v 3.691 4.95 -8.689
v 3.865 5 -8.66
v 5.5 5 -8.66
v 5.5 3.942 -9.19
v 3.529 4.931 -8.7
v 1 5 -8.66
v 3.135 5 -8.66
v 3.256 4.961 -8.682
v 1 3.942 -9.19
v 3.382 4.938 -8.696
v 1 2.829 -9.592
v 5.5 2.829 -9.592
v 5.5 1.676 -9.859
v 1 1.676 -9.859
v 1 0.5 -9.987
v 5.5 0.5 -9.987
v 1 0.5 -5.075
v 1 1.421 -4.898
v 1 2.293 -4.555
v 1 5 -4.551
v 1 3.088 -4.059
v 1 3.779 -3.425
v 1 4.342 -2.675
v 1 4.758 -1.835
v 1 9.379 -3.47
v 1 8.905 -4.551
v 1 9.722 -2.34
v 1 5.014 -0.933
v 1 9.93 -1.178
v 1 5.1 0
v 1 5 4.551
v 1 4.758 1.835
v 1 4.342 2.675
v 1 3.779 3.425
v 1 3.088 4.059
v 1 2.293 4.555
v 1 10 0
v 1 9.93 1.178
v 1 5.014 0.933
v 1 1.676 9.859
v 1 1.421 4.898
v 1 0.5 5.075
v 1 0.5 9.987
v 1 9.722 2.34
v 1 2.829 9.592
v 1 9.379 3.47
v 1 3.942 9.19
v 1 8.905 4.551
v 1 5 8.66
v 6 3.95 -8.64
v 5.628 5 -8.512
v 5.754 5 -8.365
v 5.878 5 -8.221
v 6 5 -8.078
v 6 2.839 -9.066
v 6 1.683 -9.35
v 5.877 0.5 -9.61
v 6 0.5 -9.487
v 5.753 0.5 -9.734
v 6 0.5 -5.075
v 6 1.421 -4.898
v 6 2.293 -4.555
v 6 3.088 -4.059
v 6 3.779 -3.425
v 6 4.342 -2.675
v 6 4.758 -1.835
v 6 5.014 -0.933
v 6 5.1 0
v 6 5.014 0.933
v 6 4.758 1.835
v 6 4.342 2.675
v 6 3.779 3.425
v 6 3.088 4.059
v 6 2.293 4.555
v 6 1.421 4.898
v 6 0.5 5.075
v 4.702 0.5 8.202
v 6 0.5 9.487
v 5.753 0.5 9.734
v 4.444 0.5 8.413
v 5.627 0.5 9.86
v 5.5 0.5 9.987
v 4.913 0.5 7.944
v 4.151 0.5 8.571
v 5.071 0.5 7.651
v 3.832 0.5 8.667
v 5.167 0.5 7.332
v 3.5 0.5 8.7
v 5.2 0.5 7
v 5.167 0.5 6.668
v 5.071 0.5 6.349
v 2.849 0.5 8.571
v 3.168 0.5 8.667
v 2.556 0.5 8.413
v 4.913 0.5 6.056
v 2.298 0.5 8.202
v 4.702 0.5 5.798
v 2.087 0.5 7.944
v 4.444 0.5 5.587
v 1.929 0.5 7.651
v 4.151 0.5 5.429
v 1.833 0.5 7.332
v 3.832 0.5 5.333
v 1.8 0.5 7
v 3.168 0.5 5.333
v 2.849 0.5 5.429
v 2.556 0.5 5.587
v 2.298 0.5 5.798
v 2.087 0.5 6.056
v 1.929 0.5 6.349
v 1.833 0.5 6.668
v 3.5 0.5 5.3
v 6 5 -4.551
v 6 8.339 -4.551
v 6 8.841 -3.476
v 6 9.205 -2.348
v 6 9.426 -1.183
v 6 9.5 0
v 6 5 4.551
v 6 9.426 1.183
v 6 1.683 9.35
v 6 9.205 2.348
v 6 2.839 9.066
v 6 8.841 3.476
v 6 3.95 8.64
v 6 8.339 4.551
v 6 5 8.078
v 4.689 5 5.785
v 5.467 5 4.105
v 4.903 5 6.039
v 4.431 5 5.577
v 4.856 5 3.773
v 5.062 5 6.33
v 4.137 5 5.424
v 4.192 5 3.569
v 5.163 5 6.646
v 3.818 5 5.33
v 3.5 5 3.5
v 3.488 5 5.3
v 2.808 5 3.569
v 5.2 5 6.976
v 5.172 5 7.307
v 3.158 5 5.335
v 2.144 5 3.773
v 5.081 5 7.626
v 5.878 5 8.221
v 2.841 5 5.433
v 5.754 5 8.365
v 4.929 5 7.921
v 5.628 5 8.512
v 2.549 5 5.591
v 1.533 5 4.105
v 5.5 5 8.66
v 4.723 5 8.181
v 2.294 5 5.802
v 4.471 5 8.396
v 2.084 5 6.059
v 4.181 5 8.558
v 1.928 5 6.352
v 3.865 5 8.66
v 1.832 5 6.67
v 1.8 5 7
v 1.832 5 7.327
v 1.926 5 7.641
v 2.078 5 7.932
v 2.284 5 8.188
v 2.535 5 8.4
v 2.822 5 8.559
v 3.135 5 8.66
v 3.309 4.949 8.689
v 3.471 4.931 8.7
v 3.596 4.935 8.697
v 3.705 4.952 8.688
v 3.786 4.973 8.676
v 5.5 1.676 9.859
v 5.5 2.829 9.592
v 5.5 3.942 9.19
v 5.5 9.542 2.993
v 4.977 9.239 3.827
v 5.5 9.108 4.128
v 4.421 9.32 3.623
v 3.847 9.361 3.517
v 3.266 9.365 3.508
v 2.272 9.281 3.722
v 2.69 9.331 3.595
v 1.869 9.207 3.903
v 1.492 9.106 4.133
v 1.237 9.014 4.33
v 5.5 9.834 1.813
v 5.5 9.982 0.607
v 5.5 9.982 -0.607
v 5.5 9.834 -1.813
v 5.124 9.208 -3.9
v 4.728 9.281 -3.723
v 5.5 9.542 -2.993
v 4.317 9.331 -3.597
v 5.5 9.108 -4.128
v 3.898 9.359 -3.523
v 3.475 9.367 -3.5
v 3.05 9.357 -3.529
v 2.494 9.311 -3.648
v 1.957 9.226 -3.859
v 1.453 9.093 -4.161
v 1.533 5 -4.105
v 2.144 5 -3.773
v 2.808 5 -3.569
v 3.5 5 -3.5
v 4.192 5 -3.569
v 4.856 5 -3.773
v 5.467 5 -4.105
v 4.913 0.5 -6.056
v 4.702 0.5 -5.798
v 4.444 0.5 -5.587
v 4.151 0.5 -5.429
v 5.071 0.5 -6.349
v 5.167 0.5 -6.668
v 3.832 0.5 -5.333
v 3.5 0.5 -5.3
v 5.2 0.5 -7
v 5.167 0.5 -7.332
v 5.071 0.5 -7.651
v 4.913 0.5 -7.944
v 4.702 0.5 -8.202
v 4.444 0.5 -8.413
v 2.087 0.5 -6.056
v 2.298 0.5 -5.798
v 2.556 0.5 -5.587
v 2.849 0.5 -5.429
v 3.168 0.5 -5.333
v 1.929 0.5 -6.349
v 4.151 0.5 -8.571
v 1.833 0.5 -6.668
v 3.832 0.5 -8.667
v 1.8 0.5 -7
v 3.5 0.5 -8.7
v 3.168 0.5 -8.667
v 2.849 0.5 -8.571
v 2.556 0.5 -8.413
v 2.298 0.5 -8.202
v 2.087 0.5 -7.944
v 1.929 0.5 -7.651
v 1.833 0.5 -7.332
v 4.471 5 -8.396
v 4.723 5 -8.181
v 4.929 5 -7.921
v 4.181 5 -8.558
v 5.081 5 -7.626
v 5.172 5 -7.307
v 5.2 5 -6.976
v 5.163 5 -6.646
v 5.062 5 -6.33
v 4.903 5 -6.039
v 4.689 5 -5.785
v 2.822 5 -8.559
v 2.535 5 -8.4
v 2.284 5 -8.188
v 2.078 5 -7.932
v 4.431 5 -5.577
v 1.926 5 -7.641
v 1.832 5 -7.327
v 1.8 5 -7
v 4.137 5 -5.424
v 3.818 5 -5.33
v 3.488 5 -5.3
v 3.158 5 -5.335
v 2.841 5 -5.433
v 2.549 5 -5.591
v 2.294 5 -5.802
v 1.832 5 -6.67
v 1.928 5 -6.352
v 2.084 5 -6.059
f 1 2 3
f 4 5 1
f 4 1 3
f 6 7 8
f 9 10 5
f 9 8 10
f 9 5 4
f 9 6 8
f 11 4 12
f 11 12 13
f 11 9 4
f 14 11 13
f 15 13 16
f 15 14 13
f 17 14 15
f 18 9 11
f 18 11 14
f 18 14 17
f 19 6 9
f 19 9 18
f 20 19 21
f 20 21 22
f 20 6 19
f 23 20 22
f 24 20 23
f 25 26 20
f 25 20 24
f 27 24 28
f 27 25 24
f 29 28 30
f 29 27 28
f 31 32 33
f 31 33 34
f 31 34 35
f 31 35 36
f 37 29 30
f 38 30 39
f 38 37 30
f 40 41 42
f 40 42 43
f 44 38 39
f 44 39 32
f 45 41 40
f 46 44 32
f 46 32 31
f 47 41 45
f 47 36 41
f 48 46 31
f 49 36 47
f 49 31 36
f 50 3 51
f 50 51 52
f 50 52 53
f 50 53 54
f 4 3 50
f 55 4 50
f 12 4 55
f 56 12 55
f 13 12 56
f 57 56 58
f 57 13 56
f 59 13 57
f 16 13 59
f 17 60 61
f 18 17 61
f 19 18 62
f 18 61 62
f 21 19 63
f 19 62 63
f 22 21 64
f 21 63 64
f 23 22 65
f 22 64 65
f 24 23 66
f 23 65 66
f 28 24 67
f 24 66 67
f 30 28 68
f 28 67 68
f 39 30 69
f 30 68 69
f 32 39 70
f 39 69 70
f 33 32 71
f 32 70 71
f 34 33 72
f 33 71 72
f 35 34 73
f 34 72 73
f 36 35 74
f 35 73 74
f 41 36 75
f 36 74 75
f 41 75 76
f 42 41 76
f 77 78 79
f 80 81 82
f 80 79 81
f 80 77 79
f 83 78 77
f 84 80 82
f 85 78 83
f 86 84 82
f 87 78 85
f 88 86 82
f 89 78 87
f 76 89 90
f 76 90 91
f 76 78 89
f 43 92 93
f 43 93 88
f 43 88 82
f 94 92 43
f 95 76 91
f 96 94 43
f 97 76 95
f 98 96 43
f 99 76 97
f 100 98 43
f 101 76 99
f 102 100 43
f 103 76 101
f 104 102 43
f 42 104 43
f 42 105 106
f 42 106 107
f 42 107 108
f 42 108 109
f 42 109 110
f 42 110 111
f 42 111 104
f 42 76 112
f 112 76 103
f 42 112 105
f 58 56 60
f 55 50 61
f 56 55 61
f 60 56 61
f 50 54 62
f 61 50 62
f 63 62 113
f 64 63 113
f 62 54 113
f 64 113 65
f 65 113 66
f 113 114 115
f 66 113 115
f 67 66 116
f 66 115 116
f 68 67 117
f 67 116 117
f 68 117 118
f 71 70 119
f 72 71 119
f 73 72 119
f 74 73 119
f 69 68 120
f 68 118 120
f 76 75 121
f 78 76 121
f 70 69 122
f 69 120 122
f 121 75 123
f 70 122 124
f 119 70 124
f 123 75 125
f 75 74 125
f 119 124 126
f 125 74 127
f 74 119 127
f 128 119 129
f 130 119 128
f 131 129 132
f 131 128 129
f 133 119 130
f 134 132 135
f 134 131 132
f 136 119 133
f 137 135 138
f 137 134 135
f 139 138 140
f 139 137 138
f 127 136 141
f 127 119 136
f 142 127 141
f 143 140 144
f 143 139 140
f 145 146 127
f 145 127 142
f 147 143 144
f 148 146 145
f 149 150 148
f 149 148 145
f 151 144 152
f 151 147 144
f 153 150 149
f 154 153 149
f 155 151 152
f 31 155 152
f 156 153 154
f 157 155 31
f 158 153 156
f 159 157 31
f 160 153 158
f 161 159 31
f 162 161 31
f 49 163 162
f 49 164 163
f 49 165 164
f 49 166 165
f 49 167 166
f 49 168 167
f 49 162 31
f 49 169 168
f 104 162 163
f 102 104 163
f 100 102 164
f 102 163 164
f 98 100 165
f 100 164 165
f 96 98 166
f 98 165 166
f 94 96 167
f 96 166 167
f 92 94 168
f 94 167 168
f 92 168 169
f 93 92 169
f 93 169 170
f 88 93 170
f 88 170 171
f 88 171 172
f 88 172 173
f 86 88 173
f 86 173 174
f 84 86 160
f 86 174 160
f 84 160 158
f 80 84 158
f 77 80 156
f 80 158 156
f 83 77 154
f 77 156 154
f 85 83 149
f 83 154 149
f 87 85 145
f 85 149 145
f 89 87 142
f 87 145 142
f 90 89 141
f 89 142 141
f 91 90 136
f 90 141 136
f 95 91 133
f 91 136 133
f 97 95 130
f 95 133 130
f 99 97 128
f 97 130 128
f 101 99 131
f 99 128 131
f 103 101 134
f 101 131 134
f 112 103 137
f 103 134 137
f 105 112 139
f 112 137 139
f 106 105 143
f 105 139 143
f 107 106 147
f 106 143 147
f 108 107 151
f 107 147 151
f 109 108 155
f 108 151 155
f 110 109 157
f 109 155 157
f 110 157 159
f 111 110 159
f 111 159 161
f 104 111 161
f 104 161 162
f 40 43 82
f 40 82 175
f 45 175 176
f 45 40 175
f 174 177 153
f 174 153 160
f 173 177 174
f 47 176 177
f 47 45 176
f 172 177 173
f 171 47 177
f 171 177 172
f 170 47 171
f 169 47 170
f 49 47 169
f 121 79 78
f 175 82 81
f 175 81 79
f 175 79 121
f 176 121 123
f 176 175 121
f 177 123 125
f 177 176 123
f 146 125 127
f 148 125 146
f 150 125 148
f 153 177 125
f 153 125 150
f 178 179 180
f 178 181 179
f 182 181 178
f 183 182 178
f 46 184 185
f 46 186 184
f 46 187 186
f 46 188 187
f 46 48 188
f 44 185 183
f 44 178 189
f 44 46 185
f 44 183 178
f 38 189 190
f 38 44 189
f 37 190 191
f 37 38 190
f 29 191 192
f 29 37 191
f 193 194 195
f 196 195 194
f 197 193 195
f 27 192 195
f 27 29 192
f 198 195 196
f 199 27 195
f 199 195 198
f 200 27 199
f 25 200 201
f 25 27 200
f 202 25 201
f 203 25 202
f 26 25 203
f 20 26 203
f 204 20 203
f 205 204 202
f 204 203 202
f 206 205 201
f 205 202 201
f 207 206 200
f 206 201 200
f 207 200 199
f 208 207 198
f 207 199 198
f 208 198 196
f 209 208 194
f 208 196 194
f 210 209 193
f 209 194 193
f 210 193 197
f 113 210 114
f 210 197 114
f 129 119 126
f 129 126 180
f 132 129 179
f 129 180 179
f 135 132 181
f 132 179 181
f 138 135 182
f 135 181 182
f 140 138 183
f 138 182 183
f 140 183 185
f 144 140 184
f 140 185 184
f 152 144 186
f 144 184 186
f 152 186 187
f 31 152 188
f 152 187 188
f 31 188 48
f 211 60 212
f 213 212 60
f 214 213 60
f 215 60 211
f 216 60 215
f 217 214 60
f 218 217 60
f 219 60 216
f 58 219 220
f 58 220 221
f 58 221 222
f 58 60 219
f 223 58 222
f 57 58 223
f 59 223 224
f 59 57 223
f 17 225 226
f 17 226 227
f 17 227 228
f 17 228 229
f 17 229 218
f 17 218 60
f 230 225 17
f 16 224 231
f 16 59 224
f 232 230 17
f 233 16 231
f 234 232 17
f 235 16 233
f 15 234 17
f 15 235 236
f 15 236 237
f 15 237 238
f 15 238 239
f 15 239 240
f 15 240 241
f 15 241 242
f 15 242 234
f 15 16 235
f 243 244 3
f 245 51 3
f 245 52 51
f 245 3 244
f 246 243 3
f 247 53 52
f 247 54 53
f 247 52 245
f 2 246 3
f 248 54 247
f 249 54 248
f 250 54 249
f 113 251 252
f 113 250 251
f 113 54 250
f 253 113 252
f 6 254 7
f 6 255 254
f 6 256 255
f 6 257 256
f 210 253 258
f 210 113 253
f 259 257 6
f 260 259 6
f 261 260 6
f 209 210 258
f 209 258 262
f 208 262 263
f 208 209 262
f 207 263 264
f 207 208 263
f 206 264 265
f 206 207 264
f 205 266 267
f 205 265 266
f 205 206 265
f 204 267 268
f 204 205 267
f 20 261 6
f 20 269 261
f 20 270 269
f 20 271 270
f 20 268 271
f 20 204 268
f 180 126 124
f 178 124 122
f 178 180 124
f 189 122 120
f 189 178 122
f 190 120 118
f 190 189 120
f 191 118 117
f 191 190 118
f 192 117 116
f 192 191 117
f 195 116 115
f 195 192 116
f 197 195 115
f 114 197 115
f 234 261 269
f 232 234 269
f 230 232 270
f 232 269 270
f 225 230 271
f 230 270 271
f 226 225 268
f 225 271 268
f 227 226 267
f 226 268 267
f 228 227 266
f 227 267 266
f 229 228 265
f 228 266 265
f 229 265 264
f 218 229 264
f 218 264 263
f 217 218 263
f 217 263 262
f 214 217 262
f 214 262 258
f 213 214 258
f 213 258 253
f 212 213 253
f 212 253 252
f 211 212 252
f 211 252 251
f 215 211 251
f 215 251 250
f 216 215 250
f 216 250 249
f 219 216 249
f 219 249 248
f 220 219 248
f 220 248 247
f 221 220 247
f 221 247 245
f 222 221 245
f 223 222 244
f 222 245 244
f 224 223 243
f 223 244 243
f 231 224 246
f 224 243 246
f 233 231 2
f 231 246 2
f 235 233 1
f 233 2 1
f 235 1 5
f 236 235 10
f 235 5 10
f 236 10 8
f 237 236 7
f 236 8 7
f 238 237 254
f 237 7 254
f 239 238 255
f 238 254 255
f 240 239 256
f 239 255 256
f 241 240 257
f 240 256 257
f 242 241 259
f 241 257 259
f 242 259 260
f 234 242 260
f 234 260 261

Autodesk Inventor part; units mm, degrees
sketch "Sketch_1" plane through (0, 0, 0) normal (0, 0, 1) x (1, 0, 0)
  line L0 (6, 0) -> (0, 0)
  line L1 (1, 4) -> (6, 4)
  line L2 (6, 4) -> (6, 9.5)
  line L3 (6, 9.5) -> (5.5, 10)
  line L4 (5.5, 10) -> (1, 10)
  line L5 (1, 10) -> (1, 4)
revolve "Revolution1" add sketch "Sketch_1" angle 180 mid plane about axis through (6, 0, 0) along (-1, 0, 0)
sketch "Sketch_2" plane through (0, 0, 0) normal (0, 0, 1) x (1, 0, 0)
  line L0 (0, 0.5) -> (0, 0)
  line L1 (0, 0) -> (16, 0)
  line L2 (16, 0) -> (16, 0.5)
  line L3 (16, 0.5) -> (0, 0.5)
extrude "Extrusion1" cut sketch "Sketch_2" along normal mid plane 40
sketch "Sketch_3" plane through (0, 0, 7) normal (0, 0, 1) x (1, 0, 0)
  line L0 (3.5, 10) -> (3.5, 0)
  line L1 (3.5, 0) -> (1.75, 0)
  line L2 (1.75, 0) -> (1.75, 3.5)
  line L3 (1.75, 3.5) -> (0.25, 3.5)
  line L4 (0.25, 3.5) -> (0.25, 10)
  line L5 (0.25, 10) -> (3.5, 10)
  line L6 (3.5, 10) -> (3.5, 0)
sketch "Sketch_4" plane through (0, 0, -7) normal (0, 0, 1) x (1, 0, 0)
  line L0 (3.5, 10) -> (3.5, 0)
  line L1 (3.5, 0) -> (1.75, 0)
  line L2 (1.75, 0) -> (1.75, 3.5)
  line L3 (1.75, 3.5) -> (0.25, 3.5)
  line L4 (0.25, 3.5) -> (0.25, 10)
  line L5 (0.25, 10) -> (3.5, 10)
  line L6 (3.5, 10) -> (3.5, 0)
ref_plane "part2_to_part1_XY" through (0, 0, 0) normal (1, 0, 0) x (0, 0, -1)
ref_plane "part2_to_part1_YZ" through (0, 0, 0) normal (0, 0, -1) x (0, 1, 0)
ref_plane "part2_to_part1_ZX" through (0, 0, 0) normal (0, 1, 0) x (1, 0, 0)
ref_plane "part2_to_screw1_XY" through (3.5, 3.5, 7) normal (0, 1, 0) x (1, 0, 0)
ref_plane "part2_to_screw1_YZ" through (3.5, 3.5, 7) normal (1, 0, 0) x (0, 0, -1)
ref_plane "part2_to_screw1_ZX" through (3.5, 3.5, 7) normal (0, 0, -1) x (0, 1, 0)
ref_plane "part2_to_screw2_XY" through (3.5, 3.5, -7) normal (0, 1, 0) x (1, 0, 0)
ref_plane "part2_to_screw2_YZ" through (3.5, 3.5, -7) normal (1, 0, 0) x (0, 0, -1)
ref_plane "part2_to_screw2_ZX" through (3.5, 3.5, -7) normal (0, 0, -1) x (0, 1, 0)
sketch "スケッチ7" plane through (6, 0, 0) normal (1, 0, 0) x (0, 0, -1)
  circle A0 centre (0, 0) radius 5.1
  dimension "d11" = 10.2
extrude "押し出し4" cut sketch "スケッチ7" against normal blind 10
ref_plane "作業平面10" through (3.25, 10, 0) normal (0, 1, 0) x (-1, 0, 0)
sketch "スケッチ8" plane through (3.25, 10, 0) normal (0, 1, 0) x (-1, 0, 0)
  circle A0 centre (-0.25, 7) radius 1.75 projected
  circle A1 centre (-0.25, 7) radius 1.7
  circle A2 centre (-0.25, 7) radius 3.5
  circle A3 centre (-0.25, -7) radius 1.75 projected
  circle A4 centre (-0.25, -7) radius 1.7
  circle A5 centre (-0.25, -7) radius 3.5
  point P0 (3.25, 0)
  dimension "d14" = 3.4
  dimension "d15" = 7
  dimension "d16" = 3.4
  dimension "d17" = 7
extrude "押し出し5" cut sketch "スケッチ8" against normal through all contours A1 | A4
extrude "押し出し6" cut sketch "スケッチ8" against normal blind 5 contours A0 | A1 | A2 | A3 | A4 | A5
properties part number "MBRDAC23-2-8_p2"
